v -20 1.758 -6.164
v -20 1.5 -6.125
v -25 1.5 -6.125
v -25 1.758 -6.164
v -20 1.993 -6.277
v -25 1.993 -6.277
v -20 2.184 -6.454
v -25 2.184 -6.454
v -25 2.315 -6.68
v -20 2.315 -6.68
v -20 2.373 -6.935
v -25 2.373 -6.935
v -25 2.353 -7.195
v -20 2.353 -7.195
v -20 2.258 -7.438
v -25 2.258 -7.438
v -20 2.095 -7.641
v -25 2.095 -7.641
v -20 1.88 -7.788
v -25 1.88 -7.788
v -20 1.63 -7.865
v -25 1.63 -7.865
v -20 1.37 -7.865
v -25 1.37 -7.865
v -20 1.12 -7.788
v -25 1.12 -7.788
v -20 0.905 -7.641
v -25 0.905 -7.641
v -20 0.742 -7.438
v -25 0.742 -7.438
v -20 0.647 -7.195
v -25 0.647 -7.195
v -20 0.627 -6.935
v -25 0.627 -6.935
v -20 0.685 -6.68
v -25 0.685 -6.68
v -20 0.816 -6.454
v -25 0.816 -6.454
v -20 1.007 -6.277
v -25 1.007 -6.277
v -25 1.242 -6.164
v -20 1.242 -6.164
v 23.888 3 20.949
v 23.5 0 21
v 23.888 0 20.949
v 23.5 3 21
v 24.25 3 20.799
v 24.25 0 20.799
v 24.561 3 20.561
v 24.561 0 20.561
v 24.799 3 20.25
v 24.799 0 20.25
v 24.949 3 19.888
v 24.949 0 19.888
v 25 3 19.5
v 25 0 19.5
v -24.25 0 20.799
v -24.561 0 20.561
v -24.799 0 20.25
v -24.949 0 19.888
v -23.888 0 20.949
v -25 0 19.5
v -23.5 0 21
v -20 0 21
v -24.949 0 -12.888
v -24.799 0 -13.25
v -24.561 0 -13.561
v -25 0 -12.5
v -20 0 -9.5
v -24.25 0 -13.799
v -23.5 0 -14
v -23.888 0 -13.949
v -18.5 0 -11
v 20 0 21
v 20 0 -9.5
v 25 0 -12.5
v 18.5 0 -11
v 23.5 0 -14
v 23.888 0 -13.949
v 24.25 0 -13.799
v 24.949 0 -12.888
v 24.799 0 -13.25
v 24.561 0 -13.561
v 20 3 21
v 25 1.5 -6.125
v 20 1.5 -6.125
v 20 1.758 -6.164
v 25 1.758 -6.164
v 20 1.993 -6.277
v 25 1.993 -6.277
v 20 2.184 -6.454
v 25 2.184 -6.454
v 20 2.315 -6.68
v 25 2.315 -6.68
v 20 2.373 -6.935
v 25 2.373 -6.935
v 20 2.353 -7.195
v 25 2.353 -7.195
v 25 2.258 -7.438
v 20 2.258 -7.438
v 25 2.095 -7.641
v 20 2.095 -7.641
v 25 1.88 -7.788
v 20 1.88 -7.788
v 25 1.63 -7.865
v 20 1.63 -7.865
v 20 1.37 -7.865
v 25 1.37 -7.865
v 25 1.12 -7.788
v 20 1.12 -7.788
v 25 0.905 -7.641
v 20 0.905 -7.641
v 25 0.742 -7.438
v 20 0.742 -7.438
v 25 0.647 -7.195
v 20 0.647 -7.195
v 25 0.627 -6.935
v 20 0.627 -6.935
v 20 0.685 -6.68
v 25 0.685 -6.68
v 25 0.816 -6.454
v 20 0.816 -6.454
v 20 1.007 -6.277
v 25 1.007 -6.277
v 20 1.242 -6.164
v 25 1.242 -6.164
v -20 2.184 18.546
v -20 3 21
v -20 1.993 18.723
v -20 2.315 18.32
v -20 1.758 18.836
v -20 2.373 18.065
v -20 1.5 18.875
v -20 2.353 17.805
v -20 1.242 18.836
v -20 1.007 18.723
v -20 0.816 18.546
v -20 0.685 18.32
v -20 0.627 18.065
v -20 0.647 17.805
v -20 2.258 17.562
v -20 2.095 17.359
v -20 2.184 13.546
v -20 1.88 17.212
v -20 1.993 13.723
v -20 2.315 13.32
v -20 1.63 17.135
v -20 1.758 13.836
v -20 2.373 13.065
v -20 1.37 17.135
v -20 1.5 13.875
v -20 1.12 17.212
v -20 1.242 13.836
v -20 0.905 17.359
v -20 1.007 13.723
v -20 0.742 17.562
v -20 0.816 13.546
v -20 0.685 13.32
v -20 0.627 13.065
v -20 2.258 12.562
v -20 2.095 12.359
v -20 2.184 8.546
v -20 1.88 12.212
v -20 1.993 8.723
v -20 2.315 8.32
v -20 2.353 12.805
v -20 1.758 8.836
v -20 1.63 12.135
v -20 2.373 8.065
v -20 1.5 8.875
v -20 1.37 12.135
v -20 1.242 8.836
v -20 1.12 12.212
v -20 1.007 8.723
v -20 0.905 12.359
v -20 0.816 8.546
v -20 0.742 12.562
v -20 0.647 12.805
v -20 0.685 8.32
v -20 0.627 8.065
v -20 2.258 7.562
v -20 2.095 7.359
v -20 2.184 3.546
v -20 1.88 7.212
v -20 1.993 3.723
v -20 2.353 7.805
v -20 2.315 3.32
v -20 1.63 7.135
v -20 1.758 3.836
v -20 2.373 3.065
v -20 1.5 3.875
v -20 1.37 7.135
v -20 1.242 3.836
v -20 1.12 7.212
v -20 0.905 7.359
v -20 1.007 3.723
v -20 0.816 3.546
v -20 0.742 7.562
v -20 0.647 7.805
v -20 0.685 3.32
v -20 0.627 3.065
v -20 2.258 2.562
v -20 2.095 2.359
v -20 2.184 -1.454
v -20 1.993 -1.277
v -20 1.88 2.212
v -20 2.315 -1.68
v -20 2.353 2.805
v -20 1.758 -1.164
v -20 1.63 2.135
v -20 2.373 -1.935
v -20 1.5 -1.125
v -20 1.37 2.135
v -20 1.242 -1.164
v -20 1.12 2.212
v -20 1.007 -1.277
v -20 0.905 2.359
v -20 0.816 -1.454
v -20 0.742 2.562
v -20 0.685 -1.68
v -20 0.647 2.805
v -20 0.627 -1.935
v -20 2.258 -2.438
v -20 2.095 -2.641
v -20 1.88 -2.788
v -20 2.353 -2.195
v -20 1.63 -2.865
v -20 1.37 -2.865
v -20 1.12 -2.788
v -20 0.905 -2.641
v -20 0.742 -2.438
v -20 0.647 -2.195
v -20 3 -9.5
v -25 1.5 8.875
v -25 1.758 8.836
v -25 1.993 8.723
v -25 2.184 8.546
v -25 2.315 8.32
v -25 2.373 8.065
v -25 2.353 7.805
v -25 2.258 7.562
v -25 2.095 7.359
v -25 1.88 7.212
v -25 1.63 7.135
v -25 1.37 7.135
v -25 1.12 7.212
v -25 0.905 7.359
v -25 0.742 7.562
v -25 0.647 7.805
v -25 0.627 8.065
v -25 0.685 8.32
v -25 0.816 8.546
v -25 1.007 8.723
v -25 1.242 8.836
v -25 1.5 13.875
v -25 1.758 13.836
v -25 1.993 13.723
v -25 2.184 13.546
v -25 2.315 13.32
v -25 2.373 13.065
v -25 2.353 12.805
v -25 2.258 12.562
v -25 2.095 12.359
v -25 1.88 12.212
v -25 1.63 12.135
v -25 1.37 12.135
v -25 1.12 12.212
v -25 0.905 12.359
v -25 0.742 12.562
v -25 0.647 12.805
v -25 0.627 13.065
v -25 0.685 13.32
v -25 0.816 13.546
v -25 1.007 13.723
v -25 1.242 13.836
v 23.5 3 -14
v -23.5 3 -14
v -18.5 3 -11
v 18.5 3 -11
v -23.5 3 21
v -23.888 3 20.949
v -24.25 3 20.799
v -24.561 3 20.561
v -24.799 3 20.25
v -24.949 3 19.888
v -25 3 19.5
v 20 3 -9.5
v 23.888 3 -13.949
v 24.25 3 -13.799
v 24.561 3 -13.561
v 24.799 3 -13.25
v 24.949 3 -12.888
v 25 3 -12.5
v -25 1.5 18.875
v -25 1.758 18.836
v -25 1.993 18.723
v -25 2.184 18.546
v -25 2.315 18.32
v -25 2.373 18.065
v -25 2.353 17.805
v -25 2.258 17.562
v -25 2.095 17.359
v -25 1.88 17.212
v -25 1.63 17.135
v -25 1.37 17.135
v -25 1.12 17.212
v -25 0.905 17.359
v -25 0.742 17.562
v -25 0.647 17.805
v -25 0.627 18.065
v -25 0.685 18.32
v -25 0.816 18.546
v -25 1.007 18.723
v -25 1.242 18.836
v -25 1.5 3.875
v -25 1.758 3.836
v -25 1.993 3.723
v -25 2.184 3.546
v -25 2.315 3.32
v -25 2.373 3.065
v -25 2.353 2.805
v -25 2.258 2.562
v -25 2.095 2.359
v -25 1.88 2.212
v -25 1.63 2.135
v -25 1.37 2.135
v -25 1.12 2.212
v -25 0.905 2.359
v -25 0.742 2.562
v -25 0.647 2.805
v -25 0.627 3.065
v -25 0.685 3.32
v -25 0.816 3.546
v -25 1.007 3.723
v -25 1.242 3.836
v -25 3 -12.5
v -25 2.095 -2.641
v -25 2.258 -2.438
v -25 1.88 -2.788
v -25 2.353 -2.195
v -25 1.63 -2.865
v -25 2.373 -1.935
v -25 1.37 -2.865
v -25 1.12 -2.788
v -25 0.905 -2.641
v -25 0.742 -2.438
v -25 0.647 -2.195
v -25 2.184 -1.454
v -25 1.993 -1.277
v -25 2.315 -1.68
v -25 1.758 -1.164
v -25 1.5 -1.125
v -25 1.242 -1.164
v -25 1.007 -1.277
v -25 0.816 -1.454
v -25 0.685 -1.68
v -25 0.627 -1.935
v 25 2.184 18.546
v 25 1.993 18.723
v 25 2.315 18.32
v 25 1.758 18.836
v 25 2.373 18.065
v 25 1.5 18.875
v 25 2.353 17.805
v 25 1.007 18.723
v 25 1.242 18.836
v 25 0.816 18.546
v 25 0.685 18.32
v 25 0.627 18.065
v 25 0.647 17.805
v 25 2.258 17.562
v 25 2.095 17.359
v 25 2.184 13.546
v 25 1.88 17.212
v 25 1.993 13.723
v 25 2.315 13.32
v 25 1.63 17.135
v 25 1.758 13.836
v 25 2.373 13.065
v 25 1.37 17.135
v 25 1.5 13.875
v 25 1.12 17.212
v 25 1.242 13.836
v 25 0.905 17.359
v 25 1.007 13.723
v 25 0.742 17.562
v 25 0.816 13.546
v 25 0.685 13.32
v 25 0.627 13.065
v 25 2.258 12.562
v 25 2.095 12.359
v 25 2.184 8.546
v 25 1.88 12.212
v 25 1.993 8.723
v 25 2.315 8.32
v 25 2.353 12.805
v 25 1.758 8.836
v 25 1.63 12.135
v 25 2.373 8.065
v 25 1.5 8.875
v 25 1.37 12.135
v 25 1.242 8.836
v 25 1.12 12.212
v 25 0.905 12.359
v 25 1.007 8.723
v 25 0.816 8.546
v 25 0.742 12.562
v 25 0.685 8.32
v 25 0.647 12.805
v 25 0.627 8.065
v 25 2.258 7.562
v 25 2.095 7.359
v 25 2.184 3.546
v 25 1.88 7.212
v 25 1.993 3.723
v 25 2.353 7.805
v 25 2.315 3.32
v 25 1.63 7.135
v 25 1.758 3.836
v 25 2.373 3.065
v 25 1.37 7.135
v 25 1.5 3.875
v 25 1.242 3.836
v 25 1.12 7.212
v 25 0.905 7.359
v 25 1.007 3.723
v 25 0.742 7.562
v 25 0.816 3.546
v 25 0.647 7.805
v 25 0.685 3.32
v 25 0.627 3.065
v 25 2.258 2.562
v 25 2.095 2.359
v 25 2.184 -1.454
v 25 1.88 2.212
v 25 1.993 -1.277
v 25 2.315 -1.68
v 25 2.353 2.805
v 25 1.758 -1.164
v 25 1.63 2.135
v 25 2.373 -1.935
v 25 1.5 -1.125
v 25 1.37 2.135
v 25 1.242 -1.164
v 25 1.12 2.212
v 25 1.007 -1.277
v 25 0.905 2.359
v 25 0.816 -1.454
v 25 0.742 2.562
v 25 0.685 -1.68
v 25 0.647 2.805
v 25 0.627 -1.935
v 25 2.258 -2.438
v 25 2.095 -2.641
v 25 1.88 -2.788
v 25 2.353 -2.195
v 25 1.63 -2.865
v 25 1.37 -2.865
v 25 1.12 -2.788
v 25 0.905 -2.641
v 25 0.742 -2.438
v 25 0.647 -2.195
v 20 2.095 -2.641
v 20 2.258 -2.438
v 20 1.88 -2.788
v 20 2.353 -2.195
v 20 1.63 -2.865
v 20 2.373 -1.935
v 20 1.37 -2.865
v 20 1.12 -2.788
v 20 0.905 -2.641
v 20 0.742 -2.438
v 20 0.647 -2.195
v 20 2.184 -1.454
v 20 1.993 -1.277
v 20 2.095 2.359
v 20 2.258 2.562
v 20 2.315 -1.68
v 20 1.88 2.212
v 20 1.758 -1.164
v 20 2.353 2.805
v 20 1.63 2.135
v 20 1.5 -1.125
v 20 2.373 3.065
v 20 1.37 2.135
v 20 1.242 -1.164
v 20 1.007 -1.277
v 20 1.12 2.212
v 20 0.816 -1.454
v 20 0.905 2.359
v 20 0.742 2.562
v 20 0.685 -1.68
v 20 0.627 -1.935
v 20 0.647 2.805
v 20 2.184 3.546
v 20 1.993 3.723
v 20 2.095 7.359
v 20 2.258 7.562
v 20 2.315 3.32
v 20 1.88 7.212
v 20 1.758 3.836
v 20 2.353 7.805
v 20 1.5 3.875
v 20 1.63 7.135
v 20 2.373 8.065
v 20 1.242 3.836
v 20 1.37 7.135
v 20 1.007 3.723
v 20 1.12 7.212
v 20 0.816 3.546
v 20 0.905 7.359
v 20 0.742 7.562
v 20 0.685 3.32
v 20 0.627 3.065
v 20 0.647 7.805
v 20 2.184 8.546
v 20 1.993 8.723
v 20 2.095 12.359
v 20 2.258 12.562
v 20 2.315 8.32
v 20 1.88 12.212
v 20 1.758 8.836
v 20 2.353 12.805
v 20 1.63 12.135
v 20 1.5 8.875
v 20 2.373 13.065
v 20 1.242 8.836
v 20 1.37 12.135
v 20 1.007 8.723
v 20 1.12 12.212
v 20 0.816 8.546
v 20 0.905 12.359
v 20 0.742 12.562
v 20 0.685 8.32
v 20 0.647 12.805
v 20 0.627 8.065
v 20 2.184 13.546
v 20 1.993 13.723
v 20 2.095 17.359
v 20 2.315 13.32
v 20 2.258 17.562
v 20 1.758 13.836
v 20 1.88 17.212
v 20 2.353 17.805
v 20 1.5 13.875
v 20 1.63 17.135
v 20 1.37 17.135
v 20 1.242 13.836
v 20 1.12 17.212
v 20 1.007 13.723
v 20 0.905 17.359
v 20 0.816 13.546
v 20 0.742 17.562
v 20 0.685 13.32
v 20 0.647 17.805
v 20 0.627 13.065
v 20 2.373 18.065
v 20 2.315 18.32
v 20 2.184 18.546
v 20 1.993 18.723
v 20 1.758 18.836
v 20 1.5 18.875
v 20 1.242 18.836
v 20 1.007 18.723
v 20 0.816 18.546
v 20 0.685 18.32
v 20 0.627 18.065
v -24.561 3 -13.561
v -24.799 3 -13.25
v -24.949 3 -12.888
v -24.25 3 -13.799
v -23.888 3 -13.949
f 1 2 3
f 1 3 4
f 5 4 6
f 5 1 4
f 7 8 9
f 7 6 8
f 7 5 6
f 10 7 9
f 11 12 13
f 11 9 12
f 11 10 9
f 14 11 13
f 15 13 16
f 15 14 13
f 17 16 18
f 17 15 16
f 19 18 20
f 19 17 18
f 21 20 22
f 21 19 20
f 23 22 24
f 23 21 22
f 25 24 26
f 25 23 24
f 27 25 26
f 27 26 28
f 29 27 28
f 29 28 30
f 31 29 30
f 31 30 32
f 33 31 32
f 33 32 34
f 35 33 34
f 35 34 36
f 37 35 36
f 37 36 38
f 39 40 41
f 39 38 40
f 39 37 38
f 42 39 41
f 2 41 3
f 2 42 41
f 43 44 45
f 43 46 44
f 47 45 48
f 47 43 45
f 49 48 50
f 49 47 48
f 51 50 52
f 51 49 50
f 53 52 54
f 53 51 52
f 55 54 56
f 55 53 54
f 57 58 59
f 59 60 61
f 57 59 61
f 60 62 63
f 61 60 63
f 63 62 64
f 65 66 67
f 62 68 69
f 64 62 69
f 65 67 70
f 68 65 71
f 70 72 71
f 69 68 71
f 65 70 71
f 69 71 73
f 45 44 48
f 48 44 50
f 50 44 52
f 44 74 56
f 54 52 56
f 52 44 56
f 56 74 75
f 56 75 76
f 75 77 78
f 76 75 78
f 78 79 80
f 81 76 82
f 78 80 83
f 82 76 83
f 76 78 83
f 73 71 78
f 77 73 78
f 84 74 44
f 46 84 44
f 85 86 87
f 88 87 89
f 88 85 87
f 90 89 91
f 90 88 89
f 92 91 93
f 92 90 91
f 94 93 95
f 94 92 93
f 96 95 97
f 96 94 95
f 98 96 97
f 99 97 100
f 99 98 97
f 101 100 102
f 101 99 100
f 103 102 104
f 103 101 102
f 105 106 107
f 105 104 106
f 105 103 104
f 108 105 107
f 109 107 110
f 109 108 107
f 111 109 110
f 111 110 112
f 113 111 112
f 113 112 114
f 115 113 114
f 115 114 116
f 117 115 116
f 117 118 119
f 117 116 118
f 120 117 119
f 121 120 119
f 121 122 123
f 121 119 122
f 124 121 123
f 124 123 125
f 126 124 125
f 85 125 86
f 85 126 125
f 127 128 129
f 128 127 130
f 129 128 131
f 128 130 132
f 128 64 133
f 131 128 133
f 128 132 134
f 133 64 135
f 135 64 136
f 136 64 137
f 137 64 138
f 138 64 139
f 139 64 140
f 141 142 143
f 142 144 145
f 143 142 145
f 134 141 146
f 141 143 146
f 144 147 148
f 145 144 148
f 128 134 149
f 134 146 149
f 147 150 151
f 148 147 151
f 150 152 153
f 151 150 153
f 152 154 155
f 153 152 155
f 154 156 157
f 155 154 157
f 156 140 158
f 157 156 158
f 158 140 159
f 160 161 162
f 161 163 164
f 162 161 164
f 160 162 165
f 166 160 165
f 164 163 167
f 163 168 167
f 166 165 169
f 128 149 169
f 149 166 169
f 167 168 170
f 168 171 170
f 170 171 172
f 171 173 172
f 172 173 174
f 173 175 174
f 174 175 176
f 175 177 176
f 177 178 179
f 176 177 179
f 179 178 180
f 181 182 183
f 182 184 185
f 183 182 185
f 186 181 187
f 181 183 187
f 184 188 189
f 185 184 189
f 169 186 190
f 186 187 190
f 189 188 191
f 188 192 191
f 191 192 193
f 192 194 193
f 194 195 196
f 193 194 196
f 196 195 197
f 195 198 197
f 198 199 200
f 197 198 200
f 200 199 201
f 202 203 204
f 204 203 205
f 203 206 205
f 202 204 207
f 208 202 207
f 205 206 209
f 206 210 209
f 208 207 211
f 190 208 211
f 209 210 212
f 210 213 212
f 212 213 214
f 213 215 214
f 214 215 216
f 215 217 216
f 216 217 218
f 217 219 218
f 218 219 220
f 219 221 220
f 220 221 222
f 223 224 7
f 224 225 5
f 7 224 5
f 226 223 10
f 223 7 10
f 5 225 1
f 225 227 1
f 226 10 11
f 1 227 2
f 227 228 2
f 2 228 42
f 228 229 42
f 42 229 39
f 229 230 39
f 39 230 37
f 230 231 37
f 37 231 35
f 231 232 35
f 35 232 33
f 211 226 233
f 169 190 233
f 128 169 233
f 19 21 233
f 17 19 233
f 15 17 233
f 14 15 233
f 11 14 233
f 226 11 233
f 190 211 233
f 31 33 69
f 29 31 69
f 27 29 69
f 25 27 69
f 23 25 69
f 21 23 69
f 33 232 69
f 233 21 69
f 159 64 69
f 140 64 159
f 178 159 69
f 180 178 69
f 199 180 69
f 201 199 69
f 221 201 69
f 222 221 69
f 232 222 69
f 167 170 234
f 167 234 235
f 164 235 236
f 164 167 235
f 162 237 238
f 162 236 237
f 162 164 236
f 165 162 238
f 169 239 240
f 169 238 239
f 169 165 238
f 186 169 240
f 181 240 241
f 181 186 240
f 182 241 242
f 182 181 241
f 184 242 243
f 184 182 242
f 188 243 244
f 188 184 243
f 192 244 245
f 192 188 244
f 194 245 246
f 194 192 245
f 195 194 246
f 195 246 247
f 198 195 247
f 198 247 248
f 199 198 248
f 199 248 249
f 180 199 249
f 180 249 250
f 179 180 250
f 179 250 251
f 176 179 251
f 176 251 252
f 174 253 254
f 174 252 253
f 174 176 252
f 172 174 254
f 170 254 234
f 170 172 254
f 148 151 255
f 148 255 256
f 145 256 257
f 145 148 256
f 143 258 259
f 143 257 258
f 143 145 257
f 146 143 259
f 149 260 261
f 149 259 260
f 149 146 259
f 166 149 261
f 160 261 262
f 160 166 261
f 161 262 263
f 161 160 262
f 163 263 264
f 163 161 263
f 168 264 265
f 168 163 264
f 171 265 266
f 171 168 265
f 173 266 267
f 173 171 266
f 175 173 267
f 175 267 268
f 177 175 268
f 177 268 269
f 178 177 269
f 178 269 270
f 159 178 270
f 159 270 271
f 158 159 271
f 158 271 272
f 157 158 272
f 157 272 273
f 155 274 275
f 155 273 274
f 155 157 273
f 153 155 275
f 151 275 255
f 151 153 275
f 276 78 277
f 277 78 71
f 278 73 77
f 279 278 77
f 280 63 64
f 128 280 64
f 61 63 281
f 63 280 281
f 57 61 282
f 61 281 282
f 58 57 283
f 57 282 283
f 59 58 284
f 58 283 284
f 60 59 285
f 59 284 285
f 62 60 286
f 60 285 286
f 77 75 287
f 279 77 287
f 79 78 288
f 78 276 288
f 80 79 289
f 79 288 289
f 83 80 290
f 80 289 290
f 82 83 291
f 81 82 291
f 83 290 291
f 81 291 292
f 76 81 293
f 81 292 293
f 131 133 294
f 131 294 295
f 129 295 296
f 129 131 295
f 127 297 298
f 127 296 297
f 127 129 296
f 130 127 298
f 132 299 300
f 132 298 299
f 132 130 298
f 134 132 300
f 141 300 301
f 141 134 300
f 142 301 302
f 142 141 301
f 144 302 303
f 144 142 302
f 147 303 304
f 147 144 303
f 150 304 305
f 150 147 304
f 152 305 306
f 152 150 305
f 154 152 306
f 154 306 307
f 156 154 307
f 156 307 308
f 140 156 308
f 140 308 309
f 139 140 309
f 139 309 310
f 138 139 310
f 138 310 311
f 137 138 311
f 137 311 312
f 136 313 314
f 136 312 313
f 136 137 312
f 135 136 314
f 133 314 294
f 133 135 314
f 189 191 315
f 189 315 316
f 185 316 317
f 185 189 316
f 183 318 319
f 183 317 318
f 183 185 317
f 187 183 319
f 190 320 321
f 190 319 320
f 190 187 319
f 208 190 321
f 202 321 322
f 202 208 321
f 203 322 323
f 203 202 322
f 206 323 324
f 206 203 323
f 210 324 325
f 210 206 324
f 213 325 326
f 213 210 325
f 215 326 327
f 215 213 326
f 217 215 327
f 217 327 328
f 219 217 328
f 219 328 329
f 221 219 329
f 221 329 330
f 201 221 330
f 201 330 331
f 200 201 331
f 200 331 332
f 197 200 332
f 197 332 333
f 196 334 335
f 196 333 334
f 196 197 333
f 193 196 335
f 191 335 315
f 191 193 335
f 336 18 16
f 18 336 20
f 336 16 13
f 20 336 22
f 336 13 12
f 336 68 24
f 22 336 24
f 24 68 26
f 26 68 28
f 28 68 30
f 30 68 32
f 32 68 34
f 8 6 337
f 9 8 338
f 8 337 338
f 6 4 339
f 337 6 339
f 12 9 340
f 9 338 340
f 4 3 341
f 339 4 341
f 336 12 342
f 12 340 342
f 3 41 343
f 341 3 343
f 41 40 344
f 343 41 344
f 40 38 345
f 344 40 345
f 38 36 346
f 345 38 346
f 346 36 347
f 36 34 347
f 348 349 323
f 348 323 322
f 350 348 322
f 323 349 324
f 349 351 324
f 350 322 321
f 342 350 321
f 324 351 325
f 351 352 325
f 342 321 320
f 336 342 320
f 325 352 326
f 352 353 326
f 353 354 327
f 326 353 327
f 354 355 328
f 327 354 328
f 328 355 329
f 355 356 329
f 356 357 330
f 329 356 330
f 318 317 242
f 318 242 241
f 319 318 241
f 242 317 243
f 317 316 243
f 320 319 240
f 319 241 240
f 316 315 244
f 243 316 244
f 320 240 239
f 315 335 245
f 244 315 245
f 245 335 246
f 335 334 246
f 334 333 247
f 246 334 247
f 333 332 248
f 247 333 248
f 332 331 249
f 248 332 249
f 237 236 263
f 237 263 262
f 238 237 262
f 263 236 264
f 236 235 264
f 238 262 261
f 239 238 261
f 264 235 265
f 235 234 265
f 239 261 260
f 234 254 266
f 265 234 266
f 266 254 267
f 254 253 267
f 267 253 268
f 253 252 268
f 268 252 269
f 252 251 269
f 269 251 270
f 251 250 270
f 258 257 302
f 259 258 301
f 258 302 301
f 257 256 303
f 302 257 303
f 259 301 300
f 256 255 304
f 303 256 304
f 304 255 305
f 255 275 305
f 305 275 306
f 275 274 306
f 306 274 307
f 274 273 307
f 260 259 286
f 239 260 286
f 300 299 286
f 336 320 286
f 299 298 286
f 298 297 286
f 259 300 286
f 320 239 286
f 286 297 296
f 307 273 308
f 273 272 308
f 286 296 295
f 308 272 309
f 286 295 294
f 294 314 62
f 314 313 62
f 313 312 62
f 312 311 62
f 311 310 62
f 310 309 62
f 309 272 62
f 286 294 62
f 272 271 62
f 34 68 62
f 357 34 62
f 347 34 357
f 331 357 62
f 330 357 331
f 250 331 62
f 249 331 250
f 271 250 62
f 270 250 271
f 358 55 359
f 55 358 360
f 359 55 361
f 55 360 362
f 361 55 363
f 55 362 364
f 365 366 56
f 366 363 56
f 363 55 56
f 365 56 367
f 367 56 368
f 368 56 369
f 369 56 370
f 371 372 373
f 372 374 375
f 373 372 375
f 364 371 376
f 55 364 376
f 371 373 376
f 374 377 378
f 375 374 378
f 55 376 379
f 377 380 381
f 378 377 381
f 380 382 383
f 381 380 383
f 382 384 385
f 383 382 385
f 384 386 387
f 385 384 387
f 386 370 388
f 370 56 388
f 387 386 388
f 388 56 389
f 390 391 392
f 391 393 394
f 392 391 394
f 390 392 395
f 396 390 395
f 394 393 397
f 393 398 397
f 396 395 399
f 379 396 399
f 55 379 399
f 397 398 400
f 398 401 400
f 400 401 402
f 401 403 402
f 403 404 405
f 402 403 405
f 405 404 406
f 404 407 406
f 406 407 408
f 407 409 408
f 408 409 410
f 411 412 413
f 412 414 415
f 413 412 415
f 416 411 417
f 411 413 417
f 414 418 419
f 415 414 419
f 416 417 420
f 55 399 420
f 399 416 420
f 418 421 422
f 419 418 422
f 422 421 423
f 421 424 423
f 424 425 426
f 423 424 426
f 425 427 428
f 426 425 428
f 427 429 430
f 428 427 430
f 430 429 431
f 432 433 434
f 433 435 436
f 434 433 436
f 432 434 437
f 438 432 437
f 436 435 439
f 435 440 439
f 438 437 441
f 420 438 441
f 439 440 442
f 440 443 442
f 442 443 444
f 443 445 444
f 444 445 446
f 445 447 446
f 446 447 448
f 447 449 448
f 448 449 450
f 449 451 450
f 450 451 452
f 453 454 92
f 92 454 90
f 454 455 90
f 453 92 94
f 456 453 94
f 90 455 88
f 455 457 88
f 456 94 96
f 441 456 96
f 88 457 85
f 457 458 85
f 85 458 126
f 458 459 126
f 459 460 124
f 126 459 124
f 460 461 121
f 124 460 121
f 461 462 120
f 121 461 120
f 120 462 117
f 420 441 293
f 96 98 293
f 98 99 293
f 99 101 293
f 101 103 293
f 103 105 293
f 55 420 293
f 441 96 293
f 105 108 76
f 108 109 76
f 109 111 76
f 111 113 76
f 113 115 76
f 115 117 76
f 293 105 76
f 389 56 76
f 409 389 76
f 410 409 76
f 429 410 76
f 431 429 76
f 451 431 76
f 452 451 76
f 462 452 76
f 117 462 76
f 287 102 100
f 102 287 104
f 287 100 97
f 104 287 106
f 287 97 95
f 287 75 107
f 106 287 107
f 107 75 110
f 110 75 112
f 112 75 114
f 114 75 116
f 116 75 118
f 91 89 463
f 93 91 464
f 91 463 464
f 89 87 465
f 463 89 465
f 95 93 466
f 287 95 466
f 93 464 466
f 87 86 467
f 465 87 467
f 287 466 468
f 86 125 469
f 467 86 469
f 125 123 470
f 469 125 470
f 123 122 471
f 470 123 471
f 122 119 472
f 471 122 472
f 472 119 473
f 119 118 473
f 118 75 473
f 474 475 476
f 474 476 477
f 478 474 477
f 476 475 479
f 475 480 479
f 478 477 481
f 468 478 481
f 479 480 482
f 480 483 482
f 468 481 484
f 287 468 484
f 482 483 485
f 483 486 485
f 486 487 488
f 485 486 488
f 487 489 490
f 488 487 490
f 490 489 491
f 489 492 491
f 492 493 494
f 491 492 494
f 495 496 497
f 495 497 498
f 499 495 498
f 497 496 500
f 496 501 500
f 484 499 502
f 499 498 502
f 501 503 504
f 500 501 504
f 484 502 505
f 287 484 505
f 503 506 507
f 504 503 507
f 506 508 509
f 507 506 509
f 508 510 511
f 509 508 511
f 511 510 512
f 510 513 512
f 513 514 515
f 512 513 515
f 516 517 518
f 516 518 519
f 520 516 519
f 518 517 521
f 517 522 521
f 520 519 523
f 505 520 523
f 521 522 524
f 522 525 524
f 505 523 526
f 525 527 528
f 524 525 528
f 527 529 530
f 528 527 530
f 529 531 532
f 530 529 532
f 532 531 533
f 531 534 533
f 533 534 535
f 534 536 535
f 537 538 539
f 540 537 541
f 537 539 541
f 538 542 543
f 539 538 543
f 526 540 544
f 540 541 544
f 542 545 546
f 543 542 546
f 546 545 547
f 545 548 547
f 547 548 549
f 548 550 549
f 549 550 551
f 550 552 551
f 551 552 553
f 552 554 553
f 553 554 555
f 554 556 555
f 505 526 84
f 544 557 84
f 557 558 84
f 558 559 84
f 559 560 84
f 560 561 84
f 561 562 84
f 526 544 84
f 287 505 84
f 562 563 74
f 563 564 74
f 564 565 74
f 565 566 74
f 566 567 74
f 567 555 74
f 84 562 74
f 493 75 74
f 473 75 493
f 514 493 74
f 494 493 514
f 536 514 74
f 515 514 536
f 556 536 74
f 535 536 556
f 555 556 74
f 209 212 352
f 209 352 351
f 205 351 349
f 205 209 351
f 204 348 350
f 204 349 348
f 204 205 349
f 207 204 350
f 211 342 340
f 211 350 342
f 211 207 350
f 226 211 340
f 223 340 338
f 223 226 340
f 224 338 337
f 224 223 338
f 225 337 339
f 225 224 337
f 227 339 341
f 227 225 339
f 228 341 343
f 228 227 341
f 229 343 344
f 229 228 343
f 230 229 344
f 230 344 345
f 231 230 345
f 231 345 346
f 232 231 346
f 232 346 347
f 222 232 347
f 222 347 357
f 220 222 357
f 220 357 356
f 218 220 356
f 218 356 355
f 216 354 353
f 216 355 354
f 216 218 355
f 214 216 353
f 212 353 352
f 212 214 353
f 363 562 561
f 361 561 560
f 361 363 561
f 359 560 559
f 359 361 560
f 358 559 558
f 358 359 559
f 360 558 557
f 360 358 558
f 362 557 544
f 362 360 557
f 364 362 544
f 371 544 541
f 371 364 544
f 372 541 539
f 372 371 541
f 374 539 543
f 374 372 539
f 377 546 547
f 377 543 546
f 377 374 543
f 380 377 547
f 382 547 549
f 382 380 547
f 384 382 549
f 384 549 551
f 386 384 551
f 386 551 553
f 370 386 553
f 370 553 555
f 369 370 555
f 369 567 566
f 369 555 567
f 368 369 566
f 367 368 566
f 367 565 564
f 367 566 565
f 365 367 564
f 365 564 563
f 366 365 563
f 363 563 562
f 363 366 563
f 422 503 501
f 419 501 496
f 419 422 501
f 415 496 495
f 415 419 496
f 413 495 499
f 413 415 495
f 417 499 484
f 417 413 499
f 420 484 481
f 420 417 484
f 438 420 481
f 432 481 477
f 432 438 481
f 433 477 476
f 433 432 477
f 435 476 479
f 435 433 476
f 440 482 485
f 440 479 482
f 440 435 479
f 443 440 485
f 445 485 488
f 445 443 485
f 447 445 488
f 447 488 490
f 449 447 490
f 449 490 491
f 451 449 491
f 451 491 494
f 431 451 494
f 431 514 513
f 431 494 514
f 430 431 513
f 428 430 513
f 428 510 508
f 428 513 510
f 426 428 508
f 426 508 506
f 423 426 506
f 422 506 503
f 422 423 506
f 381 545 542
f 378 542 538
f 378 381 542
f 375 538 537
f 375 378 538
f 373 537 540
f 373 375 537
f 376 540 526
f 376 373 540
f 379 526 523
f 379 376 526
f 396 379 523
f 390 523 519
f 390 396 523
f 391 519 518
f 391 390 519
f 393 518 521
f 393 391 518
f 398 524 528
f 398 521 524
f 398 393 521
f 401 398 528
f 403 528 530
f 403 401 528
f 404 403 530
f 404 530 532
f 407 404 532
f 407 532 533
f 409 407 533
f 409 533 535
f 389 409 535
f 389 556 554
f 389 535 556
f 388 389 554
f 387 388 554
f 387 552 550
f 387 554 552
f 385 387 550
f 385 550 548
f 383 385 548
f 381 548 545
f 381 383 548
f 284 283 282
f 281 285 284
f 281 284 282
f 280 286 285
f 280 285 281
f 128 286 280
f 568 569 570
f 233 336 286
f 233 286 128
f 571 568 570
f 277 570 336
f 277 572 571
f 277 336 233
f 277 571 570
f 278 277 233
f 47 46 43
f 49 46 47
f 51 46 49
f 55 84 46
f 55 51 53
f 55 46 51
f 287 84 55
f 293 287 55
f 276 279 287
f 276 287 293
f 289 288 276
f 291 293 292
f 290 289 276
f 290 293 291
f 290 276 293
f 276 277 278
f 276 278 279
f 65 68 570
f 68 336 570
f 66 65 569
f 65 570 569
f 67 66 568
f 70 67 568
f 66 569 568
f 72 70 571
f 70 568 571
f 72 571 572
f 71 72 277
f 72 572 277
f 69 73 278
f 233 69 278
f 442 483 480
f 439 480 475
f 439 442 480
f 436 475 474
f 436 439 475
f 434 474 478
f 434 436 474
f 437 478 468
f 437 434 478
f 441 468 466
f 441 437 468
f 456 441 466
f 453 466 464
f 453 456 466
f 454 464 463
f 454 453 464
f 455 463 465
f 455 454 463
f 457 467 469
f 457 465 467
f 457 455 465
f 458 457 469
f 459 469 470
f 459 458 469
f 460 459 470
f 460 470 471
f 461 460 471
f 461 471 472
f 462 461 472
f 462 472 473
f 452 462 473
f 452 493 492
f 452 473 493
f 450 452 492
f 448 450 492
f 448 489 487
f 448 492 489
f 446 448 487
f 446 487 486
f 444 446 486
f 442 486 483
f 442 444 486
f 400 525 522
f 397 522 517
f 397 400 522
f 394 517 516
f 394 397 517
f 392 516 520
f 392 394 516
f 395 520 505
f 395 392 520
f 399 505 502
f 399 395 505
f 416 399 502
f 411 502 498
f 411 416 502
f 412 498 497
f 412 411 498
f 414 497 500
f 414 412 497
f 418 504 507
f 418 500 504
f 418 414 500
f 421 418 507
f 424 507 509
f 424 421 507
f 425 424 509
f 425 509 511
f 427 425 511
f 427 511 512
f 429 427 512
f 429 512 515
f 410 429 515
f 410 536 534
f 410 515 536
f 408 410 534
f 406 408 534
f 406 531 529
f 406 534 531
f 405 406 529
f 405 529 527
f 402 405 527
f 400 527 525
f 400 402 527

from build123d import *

# Parameters (mm, degrees)
BOSS_EXTRUDE1_DEPTH     = 3
SKETCH2_R               = 0.875
CUT_EXTRUDE1_DEPTH      = 51
CUT_EXTRUDE1_DEPTH_BACK = 3
FILLET2_R               = 1.5
CHAMFER1_SIZE           = 1.5


with BuildPart() as part:
    # Sketch1 → Boss-Extrude1 (new body)
    with BuildSketch(Plane(origin=(0, 0, 0), x_dir=(1, 0, 0), z_dir=(0, 1, 0))):
        Polygon((-25, -21), (-20, -21), (-20, 11), (20, 11), (20, -21), (25, -21), (25, 14), (-25, 14), align=None)
    extrude(amount=BOSS_EXTRUDE1_DEPTH)

    # Sketch2 → Cut-Extrude1 (cut, two sides)
    with BuildSketch(Plane.ZY.offset(-25)) as cut_extrude1_sk:
        with Locations((18, 1.5)):
            Circle(SKETCH2_R)
        with Locations((13, 1.5)):
            Circle(SKETCH2_R)
        with Locations((8, 1.5)):
            Circle(SKETCH2_R)
        with Locations((3, 1.5)):
            Circle(SKETCH2_R)
        with Locations((-2, 1.5)):
            Circle(SKETCH2_R)
        with Locations((-7, 1.5)):
            Circle(SKETCH2_R)
    extrude(amount=CUT_EXTRUDE1_DEPTH, mode=Mode.SUBTRACT)
    extrude(cut_extrude1_sk.sketch, amount=-CUT_EXTRUDE1_DEPTH_BACK, mode=Mode.SUBTRACT)

    # Fillet2
    fillet2_edges = [part.edges().sort_by_distance(p)[0] for p in [
        (25, 1.5, 21),
        (-25, 1.5, 21),
        (-25, 1.5, -14),
        (25, 1.5, -14),
    ]]
    fillet(fillet2_edges, radius=FILLET2_R)

    # Chamfer1
    chamfer1_edges = [part.edges().sort_by_distance(p)[0] for p in [
        (20, 1.5, -11),
        (-20, 1.5, -11),
    ]]
    chamfer(chamfer1_edges, length=CHAMFER1_SIZE)


solid = part.part
